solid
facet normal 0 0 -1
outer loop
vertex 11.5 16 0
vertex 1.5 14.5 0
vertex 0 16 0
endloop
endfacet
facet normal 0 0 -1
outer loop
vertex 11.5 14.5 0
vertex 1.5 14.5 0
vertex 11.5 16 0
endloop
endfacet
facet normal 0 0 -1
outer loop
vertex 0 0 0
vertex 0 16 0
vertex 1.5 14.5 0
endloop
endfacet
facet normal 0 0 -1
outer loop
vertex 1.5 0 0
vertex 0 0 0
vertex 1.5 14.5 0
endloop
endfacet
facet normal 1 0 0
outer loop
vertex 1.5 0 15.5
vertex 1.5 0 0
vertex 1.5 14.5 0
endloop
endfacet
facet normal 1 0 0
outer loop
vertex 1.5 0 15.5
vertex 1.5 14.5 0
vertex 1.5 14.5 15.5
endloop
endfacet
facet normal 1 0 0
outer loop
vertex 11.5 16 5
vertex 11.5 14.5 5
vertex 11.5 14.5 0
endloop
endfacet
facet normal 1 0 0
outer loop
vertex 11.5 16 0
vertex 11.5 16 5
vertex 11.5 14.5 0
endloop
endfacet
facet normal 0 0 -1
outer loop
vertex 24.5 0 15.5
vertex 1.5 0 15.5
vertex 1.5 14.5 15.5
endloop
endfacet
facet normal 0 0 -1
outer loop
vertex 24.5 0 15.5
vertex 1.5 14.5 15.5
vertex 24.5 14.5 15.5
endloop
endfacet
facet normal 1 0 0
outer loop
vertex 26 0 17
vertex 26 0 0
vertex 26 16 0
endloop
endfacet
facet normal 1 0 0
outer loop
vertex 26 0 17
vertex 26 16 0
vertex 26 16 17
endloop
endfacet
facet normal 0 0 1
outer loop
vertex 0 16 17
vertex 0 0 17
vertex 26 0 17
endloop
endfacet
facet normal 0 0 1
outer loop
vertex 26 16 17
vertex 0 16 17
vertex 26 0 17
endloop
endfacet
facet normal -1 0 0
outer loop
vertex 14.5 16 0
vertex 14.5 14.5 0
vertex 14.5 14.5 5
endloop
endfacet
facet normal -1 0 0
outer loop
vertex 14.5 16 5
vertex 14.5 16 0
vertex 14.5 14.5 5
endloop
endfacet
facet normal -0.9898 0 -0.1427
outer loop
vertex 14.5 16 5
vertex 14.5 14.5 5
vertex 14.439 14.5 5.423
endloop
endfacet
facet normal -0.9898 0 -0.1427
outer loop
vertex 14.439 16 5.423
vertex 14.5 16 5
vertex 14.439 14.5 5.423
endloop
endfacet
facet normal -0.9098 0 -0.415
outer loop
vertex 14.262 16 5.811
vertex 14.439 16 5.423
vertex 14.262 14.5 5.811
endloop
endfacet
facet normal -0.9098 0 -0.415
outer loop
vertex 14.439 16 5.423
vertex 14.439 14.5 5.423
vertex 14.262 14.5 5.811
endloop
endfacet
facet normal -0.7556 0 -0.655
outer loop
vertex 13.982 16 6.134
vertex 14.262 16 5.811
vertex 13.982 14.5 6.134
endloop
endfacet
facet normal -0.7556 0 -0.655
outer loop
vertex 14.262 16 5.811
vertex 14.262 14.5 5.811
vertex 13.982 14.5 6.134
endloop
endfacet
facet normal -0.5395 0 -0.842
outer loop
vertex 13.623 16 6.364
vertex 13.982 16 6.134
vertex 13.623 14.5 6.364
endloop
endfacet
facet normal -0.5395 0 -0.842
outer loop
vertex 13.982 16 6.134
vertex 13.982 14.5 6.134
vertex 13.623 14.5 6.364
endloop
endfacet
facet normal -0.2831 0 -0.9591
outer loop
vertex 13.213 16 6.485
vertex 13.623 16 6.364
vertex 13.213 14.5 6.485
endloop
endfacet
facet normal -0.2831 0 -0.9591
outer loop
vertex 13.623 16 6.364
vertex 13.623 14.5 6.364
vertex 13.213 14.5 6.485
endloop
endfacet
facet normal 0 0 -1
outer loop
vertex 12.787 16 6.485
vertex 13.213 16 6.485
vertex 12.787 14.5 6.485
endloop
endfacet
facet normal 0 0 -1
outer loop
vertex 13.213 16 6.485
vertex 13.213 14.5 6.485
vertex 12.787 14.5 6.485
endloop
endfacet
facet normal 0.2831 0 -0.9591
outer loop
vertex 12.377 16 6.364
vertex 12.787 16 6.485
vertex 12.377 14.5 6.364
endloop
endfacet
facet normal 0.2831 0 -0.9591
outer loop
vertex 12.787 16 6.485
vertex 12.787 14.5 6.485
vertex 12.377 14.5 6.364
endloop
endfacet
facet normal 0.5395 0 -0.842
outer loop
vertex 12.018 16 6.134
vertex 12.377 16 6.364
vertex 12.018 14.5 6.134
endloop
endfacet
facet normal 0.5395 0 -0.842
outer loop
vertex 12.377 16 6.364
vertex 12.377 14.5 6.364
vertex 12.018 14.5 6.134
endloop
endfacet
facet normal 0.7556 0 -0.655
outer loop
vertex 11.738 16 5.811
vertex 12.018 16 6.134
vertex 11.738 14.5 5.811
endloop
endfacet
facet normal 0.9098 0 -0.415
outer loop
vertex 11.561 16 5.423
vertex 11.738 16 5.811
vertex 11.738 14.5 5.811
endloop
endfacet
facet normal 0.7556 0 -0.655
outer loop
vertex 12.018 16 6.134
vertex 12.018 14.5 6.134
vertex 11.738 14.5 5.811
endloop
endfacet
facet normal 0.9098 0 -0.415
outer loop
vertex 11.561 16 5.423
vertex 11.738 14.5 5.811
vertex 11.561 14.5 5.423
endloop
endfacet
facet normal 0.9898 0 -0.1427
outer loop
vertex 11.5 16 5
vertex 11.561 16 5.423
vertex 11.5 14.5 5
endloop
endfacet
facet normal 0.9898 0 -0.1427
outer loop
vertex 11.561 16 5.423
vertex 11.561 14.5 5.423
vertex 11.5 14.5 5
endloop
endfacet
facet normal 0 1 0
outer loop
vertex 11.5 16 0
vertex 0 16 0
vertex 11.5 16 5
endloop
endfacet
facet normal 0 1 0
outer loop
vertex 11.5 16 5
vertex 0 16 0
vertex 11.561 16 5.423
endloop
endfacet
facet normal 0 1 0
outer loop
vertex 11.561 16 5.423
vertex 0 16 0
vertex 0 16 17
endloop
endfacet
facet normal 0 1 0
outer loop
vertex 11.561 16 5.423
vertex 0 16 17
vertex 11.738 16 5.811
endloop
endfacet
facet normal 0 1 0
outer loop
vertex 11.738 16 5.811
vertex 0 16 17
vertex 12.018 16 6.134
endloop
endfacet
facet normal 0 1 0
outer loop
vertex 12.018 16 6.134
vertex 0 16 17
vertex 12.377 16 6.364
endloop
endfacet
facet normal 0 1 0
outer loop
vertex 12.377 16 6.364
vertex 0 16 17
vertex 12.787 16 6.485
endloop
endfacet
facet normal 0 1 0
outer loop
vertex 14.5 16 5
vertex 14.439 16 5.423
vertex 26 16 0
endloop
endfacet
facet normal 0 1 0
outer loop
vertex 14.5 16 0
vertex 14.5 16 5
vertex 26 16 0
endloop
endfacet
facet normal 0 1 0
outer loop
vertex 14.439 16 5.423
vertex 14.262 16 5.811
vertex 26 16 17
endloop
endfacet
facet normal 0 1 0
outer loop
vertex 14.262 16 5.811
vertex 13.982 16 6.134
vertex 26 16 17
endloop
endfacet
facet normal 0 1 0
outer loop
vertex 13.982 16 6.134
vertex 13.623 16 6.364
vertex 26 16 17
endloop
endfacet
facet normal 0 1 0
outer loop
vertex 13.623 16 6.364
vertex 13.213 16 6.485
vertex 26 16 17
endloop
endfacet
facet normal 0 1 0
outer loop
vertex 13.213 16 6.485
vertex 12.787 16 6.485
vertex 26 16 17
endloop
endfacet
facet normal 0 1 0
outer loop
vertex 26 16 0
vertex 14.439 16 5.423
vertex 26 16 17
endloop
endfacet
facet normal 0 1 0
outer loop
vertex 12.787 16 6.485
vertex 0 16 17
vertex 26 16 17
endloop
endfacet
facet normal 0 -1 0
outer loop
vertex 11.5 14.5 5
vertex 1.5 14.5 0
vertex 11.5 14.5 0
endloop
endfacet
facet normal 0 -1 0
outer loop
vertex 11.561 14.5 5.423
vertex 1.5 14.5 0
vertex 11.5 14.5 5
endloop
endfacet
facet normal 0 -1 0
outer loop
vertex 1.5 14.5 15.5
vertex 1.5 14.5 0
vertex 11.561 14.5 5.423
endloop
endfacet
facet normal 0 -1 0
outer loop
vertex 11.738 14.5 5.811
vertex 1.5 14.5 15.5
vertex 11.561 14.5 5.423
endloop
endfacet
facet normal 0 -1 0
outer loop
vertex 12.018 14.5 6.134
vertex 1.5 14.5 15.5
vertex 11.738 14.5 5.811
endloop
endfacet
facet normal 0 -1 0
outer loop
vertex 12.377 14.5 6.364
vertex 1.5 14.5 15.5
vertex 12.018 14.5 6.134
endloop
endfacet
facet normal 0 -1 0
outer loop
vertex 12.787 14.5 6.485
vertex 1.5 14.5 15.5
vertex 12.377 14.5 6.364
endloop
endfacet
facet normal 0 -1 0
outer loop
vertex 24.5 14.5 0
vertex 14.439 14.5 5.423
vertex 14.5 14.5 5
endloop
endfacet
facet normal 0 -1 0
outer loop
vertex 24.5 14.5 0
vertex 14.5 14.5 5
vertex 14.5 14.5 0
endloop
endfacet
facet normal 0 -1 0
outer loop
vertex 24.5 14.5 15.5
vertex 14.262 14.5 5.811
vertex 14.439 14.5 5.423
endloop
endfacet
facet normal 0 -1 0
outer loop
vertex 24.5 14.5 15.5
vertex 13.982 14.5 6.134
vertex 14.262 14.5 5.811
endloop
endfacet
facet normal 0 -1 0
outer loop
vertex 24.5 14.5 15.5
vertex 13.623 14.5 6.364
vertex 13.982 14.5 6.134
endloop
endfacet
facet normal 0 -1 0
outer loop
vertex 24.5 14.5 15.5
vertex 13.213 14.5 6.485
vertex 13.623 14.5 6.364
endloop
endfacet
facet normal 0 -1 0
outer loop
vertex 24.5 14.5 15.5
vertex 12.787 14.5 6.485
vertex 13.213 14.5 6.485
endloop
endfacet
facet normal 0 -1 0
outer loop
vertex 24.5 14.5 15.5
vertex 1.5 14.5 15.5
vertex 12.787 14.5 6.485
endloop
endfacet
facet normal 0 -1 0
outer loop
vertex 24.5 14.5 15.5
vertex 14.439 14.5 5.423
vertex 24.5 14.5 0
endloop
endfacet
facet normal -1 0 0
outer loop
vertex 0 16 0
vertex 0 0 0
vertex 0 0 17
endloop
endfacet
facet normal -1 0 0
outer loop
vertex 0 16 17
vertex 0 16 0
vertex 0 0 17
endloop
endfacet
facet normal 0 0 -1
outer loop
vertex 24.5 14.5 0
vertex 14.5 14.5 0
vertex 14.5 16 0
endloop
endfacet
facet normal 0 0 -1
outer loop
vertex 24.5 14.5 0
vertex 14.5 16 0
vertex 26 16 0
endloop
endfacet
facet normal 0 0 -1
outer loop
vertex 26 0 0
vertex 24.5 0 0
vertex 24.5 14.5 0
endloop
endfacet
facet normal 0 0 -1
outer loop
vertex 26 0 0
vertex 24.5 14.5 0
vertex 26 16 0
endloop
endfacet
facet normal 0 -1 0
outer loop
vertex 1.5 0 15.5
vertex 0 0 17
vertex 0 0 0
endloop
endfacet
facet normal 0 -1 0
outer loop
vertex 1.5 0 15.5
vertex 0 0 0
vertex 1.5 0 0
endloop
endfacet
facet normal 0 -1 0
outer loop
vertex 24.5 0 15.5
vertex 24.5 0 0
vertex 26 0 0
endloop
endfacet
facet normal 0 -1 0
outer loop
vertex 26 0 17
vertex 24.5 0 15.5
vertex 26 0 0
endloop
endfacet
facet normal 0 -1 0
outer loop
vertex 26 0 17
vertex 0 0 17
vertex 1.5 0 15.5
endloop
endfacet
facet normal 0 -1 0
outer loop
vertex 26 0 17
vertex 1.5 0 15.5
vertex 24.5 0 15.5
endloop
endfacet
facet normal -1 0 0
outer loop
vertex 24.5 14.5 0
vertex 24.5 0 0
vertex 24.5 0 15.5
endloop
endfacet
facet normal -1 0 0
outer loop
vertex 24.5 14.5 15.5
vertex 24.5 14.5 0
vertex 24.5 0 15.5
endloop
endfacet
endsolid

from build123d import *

# Parameters (mm, degrees)
F0_W     = 26
F0_H     = 17
F1_DEPTH = 16
F2_W     = 23
F2_H     = 15.5
F3_DEPTH = 14.5
F5_DEPTH = 25


with BuildPart() as f1:
    # F0 (on Front) → F1 (new body)
    with BuildSketch(Plane.XZ):
        with Locations((13, 8.5)):
            Rectangle(F0_W, F0_H)
    extrude(amount=-F1_DEPTH)

    # F2 (on Front) → F3 (cut)
    with BuildSketch(Plane.XZ):
        with Locations((13, 7.75)):
            Rectangle(F2_W, F2_H)
    extrude(amount=-F3_DEPTH, mode=Mode.SUBTRACT)

    # F4 (on Front) → F5 (cut)
    with BuildSketch(Plane.XZ):
        with BuildLine():
            Line((14.5, 0), (14.5, 5))
            ThreePointArc((14.5, 5), (13, 6.5), (11.5, 5))
            Line((11.5, 5), (11.5, 0))
            Line((11.5, 0), (14.5, 0))
        make_face()
    extrude(amount=-F5_DEPTH, mode=Mode.SUBTRACT)


solid = f1.part
